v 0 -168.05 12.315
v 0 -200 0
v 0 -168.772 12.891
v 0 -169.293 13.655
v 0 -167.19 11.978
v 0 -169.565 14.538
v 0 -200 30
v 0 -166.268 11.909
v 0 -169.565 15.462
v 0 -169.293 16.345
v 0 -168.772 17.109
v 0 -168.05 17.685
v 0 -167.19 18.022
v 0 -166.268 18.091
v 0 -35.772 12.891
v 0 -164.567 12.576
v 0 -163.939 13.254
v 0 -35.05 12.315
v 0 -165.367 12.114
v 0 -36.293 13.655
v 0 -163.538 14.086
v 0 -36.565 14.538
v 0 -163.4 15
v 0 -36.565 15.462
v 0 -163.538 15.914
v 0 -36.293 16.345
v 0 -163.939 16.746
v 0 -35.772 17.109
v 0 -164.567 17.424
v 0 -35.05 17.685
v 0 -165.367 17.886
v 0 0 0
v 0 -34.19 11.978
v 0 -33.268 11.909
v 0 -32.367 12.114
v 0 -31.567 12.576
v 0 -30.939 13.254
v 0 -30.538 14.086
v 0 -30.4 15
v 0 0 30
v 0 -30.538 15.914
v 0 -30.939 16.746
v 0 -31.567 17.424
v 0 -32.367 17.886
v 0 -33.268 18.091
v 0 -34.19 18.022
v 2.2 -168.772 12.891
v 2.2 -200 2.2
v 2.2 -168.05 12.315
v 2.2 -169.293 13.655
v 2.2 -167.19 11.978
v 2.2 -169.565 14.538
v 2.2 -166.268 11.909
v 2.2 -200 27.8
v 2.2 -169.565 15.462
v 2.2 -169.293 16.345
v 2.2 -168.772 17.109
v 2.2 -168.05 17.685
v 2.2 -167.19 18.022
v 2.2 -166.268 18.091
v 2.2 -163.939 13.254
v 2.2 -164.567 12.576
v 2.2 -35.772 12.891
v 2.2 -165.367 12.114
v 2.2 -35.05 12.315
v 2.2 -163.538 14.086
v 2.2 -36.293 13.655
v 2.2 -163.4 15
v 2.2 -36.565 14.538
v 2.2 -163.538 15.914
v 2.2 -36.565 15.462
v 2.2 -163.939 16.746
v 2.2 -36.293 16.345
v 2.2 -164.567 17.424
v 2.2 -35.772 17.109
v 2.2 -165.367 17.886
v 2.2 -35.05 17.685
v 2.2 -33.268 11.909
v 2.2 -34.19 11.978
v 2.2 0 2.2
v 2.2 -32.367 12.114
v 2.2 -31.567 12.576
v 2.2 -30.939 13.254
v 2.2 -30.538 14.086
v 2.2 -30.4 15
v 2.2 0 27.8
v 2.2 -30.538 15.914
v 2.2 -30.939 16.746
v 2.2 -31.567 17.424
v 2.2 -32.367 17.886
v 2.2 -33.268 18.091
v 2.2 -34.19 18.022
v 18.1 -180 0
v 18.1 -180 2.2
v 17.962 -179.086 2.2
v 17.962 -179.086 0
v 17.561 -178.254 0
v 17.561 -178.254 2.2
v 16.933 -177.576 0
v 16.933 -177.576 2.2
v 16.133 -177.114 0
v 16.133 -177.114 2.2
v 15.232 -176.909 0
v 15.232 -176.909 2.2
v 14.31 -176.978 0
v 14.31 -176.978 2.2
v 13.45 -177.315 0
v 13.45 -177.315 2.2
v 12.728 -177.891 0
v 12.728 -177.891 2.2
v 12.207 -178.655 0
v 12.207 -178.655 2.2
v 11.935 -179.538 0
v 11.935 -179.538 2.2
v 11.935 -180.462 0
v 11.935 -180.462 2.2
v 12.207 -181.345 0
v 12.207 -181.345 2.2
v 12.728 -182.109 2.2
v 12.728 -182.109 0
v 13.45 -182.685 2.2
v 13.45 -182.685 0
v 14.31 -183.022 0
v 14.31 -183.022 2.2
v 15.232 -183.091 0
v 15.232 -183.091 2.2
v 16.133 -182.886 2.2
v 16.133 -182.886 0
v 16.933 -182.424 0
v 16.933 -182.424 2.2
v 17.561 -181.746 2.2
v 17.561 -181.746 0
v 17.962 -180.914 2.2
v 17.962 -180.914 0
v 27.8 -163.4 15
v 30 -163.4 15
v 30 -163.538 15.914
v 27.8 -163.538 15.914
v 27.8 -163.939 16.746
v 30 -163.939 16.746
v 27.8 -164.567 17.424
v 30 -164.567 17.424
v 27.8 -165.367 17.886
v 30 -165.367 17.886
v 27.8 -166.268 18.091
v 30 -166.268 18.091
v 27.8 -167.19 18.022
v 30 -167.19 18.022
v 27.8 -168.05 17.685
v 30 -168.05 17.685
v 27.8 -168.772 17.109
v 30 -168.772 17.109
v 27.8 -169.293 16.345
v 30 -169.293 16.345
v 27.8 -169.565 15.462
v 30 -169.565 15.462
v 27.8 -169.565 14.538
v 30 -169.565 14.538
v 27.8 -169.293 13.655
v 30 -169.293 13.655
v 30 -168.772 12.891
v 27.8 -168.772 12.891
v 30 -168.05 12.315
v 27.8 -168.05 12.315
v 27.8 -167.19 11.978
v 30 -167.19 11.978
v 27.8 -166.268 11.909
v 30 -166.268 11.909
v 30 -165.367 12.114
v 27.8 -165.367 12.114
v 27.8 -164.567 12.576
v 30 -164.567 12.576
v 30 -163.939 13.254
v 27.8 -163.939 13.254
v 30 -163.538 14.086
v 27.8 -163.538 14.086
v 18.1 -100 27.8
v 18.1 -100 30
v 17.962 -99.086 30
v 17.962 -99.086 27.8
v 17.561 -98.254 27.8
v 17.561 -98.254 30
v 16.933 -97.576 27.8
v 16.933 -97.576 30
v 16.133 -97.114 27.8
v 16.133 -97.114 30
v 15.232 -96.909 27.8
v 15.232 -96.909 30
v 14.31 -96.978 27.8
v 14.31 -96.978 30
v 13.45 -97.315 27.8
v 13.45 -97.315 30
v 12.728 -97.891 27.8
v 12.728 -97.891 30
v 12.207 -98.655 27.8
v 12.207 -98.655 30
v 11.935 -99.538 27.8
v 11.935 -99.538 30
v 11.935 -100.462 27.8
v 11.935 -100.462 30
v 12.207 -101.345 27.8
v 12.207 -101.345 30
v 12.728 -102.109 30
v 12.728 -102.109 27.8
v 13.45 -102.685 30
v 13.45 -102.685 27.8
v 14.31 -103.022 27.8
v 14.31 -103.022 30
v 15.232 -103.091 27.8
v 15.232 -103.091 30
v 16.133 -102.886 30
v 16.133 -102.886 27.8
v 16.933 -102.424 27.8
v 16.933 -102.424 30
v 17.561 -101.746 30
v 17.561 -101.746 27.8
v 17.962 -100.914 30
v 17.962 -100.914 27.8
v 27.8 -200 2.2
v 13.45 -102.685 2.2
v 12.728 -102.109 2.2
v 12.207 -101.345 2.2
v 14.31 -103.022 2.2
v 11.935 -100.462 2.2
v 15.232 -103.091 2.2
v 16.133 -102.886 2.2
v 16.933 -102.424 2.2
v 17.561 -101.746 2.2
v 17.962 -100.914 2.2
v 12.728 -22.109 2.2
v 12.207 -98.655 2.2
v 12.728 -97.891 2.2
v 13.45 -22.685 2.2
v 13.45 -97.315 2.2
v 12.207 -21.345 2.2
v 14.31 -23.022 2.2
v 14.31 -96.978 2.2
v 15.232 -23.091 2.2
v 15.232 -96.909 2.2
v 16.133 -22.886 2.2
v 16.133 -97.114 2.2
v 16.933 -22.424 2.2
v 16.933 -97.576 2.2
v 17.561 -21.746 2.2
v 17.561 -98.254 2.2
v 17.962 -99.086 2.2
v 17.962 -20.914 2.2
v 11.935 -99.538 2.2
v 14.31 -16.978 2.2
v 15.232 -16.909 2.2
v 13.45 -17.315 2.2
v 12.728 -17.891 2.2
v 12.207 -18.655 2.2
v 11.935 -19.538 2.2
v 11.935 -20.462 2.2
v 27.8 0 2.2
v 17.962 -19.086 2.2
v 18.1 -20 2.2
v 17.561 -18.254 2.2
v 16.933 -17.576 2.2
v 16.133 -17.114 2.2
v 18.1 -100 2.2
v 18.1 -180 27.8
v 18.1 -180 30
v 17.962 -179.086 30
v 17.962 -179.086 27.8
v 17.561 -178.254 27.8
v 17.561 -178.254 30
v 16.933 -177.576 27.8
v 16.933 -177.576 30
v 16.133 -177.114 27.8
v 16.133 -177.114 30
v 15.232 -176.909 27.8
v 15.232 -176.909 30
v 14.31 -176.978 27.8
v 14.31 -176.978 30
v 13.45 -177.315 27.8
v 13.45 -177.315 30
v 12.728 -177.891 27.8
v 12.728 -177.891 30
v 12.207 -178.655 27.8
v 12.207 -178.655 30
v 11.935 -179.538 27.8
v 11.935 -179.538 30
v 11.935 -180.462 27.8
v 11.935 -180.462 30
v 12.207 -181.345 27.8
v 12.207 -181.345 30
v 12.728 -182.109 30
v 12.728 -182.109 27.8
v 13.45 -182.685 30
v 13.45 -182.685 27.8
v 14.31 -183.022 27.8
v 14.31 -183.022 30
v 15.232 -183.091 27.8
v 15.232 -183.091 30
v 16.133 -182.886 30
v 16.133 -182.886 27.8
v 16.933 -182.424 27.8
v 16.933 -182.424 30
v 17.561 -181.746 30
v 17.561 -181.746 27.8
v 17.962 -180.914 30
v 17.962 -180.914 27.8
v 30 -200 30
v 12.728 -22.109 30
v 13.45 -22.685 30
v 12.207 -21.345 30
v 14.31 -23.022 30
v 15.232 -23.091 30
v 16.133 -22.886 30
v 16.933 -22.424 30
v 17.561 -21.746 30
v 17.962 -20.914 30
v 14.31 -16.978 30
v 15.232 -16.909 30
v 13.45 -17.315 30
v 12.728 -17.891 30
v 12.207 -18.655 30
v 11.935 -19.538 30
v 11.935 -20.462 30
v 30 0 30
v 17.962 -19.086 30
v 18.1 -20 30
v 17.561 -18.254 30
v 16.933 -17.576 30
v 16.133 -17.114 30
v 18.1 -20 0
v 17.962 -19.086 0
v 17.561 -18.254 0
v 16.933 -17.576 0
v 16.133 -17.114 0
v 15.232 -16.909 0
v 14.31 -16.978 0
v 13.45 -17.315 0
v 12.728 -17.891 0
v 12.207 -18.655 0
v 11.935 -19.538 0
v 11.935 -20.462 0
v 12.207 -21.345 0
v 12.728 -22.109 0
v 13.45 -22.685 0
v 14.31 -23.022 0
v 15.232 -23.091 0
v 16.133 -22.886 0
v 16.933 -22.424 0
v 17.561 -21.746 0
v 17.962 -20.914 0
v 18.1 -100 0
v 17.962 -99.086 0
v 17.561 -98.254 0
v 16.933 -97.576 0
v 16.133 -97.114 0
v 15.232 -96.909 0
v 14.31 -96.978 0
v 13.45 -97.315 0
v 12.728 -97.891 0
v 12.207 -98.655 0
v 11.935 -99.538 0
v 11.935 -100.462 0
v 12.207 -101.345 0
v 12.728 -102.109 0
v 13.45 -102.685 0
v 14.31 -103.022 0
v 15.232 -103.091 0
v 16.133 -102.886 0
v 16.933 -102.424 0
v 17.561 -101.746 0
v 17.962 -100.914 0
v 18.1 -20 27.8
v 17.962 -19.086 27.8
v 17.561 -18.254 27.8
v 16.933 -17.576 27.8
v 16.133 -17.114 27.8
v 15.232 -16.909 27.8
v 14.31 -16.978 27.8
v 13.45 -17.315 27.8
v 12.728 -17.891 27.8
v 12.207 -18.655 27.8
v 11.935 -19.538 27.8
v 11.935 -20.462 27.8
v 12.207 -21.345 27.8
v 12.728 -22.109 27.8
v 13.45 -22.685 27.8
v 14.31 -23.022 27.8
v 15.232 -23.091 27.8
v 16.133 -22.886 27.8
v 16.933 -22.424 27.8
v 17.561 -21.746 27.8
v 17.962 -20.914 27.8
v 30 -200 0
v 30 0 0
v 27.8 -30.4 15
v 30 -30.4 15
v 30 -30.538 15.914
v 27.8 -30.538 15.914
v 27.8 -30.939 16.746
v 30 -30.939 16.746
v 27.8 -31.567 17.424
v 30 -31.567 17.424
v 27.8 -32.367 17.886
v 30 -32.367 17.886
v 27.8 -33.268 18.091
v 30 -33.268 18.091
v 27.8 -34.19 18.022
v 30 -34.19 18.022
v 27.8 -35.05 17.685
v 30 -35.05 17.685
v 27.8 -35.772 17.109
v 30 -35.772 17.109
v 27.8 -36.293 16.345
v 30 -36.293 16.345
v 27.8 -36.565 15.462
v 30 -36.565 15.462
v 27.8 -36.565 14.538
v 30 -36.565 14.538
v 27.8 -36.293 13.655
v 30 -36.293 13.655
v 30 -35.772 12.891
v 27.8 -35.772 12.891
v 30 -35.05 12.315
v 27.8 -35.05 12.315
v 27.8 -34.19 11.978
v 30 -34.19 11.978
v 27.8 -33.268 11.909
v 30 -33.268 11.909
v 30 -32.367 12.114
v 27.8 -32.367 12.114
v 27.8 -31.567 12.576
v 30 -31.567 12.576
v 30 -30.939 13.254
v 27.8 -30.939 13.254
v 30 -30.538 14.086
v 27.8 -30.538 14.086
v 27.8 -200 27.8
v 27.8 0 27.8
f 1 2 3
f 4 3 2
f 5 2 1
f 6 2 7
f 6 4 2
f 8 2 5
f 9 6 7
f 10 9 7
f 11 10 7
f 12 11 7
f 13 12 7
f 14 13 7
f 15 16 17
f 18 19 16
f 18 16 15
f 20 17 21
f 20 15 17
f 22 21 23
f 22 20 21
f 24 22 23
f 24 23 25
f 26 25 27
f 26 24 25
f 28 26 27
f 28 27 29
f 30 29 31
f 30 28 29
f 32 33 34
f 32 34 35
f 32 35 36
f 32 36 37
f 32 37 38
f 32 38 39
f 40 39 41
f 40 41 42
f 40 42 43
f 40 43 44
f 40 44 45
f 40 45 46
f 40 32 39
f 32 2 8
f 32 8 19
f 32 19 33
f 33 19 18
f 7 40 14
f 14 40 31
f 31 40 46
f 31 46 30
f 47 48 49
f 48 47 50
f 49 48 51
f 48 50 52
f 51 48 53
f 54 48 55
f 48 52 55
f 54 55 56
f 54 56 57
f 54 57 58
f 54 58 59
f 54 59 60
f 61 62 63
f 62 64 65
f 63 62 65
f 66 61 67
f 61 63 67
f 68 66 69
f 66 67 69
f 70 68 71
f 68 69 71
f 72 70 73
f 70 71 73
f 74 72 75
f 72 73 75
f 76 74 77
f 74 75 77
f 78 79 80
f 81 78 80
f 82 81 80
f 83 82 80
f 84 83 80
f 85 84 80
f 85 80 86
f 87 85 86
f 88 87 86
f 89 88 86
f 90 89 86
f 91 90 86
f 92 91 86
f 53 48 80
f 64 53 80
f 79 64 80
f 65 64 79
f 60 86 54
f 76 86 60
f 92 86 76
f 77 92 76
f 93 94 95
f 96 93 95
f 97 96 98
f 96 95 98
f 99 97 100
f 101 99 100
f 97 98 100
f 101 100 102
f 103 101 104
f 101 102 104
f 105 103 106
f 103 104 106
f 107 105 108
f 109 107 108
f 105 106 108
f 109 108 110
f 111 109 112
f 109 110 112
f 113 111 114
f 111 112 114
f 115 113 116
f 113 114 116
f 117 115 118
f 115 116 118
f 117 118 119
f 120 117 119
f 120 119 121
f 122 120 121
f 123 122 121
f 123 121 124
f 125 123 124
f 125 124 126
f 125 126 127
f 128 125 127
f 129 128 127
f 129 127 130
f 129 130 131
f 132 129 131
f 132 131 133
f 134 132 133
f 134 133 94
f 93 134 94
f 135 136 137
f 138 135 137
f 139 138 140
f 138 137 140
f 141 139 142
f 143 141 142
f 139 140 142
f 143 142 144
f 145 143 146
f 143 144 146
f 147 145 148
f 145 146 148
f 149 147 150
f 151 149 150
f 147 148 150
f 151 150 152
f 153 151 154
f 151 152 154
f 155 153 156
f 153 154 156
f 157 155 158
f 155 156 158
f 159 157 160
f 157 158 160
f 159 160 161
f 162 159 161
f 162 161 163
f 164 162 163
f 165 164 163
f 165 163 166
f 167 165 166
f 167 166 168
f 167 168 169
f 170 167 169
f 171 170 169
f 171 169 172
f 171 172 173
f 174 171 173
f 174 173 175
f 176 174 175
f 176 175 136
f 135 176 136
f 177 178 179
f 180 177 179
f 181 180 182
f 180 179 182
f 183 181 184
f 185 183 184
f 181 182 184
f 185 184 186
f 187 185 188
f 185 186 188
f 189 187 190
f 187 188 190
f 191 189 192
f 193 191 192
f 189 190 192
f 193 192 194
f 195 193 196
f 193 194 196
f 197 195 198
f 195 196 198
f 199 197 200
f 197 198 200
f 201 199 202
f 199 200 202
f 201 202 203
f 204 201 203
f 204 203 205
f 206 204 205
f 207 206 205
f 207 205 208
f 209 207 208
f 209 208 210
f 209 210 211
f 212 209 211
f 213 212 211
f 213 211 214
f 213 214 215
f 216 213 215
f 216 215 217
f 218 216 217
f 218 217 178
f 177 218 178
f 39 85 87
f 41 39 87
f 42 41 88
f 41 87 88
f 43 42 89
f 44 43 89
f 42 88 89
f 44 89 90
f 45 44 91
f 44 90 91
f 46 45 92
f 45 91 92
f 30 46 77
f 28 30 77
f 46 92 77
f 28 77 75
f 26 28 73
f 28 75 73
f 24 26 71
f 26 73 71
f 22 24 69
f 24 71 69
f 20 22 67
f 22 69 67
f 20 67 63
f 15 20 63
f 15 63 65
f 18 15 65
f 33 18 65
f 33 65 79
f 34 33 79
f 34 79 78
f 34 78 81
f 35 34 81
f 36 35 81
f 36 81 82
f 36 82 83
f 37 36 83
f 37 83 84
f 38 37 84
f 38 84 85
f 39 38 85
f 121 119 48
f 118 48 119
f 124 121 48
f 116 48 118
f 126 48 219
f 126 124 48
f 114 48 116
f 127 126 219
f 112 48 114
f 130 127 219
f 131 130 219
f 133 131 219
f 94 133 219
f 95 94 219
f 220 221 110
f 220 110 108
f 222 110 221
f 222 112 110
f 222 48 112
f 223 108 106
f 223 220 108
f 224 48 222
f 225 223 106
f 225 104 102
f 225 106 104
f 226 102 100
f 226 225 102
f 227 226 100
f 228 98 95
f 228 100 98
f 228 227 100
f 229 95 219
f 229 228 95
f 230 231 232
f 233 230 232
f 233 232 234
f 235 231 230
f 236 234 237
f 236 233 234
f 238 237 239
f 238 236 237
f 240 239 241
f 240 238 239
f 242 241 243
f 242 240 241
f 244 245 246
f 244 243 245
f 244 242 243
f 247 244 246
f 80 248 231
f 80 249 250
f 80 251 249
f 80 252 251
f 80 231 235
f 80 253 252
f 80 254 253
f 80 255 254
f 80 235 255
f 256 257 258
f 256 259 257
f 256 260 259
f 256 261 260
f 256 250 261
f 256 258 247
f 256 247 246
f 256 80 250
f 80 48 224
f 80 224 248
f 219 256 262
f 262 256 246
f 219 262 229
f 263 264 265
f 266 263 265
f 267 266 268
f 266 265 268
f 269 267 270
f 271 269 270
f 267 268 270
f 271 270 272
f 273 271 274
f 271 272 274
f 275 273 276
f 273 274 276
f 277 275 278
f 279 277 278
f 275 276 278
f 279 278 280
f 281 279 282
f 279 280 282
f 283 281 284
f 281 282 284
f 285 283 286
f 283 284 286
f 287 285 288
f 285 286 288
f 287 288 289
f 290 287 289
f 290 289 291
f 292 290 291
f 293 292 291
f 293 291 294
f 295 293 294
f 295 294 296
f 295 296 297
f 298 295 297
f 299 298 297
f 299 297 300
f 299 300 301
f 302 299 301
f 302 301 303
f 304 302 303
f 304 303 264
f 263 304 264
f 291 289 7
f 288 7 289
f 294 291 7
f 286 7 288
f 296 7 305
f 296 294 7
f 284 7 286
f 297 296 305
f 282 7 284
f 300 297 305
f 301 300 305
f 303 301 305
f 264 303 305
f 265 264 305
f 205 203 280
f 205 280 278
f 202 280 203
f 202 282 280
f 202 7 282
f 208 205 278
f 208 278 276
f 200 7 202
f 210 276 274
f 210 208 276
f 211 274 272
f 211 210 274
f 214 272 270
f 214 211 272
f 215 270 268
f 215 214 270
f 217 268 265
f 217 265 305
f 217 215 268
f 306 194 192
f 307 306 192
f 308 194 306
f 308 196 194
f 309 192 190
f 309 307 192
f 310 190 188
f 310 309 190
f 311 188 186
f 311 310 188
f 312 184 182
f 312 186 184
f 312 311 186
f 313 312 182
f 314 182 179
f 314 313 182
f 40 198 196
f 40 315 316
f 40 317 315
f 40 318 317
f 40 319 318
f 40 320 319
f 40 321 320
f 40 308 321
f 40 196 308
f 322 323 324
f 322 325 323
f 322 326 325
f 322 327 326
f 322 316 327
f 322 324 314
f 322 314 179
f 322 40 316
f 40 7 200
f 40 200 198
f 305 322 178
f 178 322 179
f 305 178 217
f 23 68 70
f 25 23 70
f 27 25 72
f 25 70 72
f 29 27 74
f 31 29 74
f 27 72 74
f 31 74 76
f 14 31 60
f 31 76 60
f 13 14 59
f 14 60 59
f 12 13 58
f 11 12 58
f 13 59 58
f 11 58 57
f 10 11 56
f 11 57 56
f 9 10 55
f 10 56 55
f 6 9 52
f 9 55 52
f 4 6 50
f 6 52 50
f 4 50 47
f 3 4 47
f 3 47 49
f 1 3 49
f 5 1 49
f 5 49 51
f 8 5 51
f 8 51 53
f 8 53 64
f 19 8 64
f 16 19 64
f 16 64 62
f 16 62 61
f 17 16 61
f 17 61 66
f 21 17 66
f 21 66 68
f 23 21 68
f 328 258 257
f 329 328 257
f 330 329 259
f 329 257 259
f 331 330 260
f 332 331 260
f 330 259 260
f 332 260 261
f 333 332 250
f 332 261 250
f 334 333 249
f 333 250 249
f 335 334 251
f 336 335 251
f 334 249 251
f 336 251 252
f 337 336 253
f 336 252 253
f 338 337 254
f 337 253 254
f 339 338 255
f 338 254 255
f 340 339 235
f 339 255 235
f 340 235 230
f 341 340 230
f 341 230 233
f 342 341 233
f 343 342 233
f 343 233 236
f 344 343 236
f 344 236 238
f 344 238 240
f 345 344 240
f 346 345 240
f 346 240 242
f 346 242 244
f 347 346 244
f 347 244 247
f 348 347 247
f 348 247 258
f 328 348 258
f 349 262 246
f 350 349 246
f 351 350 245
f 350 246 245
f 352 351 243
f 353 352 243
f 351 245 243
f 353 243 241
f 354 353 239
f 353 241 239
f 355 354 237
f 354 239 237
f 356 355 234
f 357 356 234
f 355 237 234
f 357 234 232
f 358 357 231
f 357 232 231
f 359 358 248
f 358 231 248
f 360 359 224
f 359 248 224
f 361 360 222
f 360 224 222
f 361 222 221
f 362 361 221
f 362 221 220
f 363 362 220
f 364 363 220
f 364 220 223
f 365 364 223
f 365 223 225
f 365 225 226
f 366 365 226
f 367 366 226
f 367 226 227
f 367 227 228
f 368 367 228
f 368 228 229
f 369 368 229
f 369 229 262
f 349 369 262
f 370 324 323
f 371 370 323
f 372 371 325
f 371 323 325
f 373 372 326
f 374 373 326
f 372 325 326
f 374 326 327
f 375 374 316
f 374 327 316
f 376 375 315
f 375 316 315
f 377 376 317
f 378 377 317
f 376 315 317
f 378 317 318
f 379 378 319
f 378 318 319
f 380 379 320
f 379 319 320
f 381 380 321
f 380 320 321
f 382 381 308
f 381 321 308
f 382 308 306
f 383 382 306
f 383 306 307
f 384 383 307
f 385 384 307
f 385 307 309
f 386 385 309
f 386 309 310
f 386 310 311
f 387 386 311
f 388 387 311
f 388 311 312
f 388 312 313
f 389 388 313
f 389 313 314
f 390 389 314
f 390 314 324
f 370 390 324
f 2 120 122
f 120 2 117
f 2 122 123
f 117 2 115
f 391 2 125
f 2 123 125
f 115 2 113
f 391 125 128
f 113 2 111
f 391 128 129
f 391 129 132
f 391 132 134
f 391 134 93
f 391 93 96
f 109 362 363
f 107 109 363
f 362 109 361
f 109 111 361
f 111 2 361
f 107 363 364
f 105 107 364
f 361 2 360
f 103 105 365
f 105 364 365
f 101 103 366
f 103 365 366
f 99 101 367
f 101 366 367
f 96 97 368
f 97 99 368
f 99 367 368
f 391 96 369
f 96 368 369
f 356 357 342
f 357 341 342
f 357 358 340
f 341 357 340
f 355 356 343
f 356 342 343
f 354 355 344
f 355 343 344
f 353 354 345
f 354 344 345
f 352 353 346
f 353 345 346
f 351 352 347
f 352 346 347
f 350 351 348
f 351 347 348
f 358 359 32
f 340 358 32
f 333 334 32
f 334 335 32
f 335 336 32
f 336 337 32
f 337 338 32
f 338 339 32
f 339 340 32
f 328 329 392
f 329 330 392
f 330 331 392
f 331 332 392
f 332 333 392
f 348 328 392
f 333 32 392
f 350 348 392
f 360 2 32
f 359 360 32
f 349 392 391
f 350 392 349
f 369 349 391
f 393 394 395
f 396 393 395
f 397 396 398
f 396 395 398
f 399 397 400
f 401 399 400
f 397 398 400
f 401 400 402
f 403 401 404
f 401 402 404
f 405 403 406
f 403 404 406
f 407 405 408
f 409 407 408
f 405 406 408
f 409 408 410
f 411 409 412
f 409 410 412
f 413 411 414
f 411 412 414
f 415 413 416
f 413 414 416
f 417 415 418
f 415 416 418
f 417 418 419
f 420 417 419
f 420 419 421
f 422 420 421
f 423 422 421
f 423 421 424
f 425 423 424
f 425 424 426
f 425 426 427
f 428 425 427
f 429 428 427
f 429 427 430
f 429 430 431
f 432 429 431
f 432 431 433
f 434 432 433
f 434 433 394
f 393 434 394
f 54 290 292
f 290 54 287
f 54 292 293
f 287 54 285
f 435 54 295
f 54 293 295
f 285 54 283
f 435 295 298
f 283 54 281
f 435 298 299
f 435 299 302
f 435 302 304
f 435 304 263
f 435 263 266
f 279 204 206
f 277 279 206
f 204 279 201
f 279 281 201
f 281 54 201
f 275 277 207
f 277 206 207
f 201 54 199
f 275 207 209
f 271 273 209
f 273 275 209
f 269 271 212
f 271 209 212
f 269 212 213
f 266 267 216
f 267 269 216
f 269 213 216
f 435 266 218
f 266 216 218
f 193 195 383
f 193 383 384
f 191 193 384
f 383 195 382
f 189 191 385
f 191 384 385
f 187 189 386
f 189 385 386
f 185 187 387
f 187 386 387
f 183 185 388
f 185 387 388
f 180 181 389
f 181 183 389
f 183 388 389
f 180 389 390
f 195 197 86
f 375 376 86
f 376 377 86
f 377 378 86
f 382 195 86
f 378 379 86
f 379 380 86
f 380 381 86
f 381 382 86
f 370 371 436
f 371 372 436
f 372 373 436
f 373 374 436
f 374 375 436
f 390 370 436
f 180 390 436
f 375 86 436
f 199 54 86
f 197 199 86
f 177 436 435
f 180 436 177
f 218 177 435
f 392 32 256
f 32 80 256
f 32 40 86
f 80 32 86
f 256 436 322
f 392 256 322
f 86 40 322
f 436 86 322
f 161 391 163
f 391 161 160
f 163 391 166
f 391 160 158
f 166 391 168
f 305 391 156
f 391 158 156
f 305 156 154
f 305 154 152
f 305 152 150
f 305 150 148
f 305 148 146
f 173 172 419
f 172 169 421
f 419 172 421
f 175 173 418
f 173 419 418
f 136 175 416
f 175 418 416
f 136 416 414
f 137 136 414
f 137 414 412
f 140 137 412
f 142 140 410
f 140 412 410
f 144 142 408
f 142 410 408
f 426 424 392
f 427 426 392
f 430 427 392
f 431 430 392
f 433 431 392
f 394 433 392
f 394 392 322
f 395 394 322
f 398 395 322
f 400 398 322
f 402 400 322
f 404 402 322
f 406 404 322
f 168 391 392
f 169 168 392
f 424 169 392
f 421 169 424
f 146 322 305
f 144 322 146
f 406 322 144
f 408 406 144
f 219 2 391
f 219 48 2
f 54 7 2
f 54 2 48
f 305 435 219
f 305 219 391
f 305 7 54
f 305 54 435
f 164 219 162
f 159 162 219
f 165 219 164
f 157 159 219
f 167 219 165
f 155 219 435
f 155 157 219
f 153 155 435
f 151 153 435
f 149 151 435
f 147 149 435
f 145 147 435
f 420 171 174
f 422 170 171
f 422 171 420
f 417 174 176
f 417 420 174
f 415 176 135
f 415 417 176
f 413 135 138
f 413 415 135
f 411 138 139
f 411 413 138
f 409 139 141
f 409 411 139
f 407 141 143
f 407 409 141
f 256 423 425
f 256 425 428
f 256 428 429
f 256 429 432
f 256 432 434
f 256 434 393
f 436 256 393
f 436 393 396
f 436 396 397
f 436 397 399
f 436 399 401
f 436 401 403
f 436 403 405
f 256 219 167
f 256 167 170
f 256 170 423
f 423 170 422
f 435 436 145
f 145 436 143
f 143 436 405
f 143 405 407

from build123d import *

# Parameters (mm, degrees)
F0_W     = 30
F0_H     = 30
F0_W_2   = 25.6
F0_H_2   = 25.6
F1_DEPTH = 200
F2_R     = 3.1
F3_DEPTH = 35
F4_R     = 3.1
F5_DEPTH = 35


with BuildPart() as f1:
    # F0 (on Front) → F1 (new body)
    with BuildSketch(Plane.XZ):
        with Locations((15, 15)):
            Rectangle(F0_W, F0_H)
        with Locations((15, 15)):
            Rectangle(F0_W_2, F0_H_2, mode=Mode.SUBTRACT)
    extrude(amount=F1_DEPTH)

    # F2 (on face) → F3 (cut)
    with BuildSketch(Plane.XY.offset(30)):
        with Locations((15, -20)):
            Circle(F2_R)
        with Locations((15, -100)):
            Circle(F2_R)
        with Locations((15, -180)):
            Circle(F2_R)
    extrude(amount=-F3_DEPTH, mode=Mode.SUBTRACT)

    # F4 (on face) → F5 (cut)
    with BuildSketch(Plane.YZ.offset(30)):
        with Locations((-166.5, 15)):
            Circle(F4_R)
        with Locations((-33.5, 15)):
            Circle(F4_R)
    extrude(amount=-F5_DEPTH, mode=Mode.SUBTRACT)


solid = f1.part
